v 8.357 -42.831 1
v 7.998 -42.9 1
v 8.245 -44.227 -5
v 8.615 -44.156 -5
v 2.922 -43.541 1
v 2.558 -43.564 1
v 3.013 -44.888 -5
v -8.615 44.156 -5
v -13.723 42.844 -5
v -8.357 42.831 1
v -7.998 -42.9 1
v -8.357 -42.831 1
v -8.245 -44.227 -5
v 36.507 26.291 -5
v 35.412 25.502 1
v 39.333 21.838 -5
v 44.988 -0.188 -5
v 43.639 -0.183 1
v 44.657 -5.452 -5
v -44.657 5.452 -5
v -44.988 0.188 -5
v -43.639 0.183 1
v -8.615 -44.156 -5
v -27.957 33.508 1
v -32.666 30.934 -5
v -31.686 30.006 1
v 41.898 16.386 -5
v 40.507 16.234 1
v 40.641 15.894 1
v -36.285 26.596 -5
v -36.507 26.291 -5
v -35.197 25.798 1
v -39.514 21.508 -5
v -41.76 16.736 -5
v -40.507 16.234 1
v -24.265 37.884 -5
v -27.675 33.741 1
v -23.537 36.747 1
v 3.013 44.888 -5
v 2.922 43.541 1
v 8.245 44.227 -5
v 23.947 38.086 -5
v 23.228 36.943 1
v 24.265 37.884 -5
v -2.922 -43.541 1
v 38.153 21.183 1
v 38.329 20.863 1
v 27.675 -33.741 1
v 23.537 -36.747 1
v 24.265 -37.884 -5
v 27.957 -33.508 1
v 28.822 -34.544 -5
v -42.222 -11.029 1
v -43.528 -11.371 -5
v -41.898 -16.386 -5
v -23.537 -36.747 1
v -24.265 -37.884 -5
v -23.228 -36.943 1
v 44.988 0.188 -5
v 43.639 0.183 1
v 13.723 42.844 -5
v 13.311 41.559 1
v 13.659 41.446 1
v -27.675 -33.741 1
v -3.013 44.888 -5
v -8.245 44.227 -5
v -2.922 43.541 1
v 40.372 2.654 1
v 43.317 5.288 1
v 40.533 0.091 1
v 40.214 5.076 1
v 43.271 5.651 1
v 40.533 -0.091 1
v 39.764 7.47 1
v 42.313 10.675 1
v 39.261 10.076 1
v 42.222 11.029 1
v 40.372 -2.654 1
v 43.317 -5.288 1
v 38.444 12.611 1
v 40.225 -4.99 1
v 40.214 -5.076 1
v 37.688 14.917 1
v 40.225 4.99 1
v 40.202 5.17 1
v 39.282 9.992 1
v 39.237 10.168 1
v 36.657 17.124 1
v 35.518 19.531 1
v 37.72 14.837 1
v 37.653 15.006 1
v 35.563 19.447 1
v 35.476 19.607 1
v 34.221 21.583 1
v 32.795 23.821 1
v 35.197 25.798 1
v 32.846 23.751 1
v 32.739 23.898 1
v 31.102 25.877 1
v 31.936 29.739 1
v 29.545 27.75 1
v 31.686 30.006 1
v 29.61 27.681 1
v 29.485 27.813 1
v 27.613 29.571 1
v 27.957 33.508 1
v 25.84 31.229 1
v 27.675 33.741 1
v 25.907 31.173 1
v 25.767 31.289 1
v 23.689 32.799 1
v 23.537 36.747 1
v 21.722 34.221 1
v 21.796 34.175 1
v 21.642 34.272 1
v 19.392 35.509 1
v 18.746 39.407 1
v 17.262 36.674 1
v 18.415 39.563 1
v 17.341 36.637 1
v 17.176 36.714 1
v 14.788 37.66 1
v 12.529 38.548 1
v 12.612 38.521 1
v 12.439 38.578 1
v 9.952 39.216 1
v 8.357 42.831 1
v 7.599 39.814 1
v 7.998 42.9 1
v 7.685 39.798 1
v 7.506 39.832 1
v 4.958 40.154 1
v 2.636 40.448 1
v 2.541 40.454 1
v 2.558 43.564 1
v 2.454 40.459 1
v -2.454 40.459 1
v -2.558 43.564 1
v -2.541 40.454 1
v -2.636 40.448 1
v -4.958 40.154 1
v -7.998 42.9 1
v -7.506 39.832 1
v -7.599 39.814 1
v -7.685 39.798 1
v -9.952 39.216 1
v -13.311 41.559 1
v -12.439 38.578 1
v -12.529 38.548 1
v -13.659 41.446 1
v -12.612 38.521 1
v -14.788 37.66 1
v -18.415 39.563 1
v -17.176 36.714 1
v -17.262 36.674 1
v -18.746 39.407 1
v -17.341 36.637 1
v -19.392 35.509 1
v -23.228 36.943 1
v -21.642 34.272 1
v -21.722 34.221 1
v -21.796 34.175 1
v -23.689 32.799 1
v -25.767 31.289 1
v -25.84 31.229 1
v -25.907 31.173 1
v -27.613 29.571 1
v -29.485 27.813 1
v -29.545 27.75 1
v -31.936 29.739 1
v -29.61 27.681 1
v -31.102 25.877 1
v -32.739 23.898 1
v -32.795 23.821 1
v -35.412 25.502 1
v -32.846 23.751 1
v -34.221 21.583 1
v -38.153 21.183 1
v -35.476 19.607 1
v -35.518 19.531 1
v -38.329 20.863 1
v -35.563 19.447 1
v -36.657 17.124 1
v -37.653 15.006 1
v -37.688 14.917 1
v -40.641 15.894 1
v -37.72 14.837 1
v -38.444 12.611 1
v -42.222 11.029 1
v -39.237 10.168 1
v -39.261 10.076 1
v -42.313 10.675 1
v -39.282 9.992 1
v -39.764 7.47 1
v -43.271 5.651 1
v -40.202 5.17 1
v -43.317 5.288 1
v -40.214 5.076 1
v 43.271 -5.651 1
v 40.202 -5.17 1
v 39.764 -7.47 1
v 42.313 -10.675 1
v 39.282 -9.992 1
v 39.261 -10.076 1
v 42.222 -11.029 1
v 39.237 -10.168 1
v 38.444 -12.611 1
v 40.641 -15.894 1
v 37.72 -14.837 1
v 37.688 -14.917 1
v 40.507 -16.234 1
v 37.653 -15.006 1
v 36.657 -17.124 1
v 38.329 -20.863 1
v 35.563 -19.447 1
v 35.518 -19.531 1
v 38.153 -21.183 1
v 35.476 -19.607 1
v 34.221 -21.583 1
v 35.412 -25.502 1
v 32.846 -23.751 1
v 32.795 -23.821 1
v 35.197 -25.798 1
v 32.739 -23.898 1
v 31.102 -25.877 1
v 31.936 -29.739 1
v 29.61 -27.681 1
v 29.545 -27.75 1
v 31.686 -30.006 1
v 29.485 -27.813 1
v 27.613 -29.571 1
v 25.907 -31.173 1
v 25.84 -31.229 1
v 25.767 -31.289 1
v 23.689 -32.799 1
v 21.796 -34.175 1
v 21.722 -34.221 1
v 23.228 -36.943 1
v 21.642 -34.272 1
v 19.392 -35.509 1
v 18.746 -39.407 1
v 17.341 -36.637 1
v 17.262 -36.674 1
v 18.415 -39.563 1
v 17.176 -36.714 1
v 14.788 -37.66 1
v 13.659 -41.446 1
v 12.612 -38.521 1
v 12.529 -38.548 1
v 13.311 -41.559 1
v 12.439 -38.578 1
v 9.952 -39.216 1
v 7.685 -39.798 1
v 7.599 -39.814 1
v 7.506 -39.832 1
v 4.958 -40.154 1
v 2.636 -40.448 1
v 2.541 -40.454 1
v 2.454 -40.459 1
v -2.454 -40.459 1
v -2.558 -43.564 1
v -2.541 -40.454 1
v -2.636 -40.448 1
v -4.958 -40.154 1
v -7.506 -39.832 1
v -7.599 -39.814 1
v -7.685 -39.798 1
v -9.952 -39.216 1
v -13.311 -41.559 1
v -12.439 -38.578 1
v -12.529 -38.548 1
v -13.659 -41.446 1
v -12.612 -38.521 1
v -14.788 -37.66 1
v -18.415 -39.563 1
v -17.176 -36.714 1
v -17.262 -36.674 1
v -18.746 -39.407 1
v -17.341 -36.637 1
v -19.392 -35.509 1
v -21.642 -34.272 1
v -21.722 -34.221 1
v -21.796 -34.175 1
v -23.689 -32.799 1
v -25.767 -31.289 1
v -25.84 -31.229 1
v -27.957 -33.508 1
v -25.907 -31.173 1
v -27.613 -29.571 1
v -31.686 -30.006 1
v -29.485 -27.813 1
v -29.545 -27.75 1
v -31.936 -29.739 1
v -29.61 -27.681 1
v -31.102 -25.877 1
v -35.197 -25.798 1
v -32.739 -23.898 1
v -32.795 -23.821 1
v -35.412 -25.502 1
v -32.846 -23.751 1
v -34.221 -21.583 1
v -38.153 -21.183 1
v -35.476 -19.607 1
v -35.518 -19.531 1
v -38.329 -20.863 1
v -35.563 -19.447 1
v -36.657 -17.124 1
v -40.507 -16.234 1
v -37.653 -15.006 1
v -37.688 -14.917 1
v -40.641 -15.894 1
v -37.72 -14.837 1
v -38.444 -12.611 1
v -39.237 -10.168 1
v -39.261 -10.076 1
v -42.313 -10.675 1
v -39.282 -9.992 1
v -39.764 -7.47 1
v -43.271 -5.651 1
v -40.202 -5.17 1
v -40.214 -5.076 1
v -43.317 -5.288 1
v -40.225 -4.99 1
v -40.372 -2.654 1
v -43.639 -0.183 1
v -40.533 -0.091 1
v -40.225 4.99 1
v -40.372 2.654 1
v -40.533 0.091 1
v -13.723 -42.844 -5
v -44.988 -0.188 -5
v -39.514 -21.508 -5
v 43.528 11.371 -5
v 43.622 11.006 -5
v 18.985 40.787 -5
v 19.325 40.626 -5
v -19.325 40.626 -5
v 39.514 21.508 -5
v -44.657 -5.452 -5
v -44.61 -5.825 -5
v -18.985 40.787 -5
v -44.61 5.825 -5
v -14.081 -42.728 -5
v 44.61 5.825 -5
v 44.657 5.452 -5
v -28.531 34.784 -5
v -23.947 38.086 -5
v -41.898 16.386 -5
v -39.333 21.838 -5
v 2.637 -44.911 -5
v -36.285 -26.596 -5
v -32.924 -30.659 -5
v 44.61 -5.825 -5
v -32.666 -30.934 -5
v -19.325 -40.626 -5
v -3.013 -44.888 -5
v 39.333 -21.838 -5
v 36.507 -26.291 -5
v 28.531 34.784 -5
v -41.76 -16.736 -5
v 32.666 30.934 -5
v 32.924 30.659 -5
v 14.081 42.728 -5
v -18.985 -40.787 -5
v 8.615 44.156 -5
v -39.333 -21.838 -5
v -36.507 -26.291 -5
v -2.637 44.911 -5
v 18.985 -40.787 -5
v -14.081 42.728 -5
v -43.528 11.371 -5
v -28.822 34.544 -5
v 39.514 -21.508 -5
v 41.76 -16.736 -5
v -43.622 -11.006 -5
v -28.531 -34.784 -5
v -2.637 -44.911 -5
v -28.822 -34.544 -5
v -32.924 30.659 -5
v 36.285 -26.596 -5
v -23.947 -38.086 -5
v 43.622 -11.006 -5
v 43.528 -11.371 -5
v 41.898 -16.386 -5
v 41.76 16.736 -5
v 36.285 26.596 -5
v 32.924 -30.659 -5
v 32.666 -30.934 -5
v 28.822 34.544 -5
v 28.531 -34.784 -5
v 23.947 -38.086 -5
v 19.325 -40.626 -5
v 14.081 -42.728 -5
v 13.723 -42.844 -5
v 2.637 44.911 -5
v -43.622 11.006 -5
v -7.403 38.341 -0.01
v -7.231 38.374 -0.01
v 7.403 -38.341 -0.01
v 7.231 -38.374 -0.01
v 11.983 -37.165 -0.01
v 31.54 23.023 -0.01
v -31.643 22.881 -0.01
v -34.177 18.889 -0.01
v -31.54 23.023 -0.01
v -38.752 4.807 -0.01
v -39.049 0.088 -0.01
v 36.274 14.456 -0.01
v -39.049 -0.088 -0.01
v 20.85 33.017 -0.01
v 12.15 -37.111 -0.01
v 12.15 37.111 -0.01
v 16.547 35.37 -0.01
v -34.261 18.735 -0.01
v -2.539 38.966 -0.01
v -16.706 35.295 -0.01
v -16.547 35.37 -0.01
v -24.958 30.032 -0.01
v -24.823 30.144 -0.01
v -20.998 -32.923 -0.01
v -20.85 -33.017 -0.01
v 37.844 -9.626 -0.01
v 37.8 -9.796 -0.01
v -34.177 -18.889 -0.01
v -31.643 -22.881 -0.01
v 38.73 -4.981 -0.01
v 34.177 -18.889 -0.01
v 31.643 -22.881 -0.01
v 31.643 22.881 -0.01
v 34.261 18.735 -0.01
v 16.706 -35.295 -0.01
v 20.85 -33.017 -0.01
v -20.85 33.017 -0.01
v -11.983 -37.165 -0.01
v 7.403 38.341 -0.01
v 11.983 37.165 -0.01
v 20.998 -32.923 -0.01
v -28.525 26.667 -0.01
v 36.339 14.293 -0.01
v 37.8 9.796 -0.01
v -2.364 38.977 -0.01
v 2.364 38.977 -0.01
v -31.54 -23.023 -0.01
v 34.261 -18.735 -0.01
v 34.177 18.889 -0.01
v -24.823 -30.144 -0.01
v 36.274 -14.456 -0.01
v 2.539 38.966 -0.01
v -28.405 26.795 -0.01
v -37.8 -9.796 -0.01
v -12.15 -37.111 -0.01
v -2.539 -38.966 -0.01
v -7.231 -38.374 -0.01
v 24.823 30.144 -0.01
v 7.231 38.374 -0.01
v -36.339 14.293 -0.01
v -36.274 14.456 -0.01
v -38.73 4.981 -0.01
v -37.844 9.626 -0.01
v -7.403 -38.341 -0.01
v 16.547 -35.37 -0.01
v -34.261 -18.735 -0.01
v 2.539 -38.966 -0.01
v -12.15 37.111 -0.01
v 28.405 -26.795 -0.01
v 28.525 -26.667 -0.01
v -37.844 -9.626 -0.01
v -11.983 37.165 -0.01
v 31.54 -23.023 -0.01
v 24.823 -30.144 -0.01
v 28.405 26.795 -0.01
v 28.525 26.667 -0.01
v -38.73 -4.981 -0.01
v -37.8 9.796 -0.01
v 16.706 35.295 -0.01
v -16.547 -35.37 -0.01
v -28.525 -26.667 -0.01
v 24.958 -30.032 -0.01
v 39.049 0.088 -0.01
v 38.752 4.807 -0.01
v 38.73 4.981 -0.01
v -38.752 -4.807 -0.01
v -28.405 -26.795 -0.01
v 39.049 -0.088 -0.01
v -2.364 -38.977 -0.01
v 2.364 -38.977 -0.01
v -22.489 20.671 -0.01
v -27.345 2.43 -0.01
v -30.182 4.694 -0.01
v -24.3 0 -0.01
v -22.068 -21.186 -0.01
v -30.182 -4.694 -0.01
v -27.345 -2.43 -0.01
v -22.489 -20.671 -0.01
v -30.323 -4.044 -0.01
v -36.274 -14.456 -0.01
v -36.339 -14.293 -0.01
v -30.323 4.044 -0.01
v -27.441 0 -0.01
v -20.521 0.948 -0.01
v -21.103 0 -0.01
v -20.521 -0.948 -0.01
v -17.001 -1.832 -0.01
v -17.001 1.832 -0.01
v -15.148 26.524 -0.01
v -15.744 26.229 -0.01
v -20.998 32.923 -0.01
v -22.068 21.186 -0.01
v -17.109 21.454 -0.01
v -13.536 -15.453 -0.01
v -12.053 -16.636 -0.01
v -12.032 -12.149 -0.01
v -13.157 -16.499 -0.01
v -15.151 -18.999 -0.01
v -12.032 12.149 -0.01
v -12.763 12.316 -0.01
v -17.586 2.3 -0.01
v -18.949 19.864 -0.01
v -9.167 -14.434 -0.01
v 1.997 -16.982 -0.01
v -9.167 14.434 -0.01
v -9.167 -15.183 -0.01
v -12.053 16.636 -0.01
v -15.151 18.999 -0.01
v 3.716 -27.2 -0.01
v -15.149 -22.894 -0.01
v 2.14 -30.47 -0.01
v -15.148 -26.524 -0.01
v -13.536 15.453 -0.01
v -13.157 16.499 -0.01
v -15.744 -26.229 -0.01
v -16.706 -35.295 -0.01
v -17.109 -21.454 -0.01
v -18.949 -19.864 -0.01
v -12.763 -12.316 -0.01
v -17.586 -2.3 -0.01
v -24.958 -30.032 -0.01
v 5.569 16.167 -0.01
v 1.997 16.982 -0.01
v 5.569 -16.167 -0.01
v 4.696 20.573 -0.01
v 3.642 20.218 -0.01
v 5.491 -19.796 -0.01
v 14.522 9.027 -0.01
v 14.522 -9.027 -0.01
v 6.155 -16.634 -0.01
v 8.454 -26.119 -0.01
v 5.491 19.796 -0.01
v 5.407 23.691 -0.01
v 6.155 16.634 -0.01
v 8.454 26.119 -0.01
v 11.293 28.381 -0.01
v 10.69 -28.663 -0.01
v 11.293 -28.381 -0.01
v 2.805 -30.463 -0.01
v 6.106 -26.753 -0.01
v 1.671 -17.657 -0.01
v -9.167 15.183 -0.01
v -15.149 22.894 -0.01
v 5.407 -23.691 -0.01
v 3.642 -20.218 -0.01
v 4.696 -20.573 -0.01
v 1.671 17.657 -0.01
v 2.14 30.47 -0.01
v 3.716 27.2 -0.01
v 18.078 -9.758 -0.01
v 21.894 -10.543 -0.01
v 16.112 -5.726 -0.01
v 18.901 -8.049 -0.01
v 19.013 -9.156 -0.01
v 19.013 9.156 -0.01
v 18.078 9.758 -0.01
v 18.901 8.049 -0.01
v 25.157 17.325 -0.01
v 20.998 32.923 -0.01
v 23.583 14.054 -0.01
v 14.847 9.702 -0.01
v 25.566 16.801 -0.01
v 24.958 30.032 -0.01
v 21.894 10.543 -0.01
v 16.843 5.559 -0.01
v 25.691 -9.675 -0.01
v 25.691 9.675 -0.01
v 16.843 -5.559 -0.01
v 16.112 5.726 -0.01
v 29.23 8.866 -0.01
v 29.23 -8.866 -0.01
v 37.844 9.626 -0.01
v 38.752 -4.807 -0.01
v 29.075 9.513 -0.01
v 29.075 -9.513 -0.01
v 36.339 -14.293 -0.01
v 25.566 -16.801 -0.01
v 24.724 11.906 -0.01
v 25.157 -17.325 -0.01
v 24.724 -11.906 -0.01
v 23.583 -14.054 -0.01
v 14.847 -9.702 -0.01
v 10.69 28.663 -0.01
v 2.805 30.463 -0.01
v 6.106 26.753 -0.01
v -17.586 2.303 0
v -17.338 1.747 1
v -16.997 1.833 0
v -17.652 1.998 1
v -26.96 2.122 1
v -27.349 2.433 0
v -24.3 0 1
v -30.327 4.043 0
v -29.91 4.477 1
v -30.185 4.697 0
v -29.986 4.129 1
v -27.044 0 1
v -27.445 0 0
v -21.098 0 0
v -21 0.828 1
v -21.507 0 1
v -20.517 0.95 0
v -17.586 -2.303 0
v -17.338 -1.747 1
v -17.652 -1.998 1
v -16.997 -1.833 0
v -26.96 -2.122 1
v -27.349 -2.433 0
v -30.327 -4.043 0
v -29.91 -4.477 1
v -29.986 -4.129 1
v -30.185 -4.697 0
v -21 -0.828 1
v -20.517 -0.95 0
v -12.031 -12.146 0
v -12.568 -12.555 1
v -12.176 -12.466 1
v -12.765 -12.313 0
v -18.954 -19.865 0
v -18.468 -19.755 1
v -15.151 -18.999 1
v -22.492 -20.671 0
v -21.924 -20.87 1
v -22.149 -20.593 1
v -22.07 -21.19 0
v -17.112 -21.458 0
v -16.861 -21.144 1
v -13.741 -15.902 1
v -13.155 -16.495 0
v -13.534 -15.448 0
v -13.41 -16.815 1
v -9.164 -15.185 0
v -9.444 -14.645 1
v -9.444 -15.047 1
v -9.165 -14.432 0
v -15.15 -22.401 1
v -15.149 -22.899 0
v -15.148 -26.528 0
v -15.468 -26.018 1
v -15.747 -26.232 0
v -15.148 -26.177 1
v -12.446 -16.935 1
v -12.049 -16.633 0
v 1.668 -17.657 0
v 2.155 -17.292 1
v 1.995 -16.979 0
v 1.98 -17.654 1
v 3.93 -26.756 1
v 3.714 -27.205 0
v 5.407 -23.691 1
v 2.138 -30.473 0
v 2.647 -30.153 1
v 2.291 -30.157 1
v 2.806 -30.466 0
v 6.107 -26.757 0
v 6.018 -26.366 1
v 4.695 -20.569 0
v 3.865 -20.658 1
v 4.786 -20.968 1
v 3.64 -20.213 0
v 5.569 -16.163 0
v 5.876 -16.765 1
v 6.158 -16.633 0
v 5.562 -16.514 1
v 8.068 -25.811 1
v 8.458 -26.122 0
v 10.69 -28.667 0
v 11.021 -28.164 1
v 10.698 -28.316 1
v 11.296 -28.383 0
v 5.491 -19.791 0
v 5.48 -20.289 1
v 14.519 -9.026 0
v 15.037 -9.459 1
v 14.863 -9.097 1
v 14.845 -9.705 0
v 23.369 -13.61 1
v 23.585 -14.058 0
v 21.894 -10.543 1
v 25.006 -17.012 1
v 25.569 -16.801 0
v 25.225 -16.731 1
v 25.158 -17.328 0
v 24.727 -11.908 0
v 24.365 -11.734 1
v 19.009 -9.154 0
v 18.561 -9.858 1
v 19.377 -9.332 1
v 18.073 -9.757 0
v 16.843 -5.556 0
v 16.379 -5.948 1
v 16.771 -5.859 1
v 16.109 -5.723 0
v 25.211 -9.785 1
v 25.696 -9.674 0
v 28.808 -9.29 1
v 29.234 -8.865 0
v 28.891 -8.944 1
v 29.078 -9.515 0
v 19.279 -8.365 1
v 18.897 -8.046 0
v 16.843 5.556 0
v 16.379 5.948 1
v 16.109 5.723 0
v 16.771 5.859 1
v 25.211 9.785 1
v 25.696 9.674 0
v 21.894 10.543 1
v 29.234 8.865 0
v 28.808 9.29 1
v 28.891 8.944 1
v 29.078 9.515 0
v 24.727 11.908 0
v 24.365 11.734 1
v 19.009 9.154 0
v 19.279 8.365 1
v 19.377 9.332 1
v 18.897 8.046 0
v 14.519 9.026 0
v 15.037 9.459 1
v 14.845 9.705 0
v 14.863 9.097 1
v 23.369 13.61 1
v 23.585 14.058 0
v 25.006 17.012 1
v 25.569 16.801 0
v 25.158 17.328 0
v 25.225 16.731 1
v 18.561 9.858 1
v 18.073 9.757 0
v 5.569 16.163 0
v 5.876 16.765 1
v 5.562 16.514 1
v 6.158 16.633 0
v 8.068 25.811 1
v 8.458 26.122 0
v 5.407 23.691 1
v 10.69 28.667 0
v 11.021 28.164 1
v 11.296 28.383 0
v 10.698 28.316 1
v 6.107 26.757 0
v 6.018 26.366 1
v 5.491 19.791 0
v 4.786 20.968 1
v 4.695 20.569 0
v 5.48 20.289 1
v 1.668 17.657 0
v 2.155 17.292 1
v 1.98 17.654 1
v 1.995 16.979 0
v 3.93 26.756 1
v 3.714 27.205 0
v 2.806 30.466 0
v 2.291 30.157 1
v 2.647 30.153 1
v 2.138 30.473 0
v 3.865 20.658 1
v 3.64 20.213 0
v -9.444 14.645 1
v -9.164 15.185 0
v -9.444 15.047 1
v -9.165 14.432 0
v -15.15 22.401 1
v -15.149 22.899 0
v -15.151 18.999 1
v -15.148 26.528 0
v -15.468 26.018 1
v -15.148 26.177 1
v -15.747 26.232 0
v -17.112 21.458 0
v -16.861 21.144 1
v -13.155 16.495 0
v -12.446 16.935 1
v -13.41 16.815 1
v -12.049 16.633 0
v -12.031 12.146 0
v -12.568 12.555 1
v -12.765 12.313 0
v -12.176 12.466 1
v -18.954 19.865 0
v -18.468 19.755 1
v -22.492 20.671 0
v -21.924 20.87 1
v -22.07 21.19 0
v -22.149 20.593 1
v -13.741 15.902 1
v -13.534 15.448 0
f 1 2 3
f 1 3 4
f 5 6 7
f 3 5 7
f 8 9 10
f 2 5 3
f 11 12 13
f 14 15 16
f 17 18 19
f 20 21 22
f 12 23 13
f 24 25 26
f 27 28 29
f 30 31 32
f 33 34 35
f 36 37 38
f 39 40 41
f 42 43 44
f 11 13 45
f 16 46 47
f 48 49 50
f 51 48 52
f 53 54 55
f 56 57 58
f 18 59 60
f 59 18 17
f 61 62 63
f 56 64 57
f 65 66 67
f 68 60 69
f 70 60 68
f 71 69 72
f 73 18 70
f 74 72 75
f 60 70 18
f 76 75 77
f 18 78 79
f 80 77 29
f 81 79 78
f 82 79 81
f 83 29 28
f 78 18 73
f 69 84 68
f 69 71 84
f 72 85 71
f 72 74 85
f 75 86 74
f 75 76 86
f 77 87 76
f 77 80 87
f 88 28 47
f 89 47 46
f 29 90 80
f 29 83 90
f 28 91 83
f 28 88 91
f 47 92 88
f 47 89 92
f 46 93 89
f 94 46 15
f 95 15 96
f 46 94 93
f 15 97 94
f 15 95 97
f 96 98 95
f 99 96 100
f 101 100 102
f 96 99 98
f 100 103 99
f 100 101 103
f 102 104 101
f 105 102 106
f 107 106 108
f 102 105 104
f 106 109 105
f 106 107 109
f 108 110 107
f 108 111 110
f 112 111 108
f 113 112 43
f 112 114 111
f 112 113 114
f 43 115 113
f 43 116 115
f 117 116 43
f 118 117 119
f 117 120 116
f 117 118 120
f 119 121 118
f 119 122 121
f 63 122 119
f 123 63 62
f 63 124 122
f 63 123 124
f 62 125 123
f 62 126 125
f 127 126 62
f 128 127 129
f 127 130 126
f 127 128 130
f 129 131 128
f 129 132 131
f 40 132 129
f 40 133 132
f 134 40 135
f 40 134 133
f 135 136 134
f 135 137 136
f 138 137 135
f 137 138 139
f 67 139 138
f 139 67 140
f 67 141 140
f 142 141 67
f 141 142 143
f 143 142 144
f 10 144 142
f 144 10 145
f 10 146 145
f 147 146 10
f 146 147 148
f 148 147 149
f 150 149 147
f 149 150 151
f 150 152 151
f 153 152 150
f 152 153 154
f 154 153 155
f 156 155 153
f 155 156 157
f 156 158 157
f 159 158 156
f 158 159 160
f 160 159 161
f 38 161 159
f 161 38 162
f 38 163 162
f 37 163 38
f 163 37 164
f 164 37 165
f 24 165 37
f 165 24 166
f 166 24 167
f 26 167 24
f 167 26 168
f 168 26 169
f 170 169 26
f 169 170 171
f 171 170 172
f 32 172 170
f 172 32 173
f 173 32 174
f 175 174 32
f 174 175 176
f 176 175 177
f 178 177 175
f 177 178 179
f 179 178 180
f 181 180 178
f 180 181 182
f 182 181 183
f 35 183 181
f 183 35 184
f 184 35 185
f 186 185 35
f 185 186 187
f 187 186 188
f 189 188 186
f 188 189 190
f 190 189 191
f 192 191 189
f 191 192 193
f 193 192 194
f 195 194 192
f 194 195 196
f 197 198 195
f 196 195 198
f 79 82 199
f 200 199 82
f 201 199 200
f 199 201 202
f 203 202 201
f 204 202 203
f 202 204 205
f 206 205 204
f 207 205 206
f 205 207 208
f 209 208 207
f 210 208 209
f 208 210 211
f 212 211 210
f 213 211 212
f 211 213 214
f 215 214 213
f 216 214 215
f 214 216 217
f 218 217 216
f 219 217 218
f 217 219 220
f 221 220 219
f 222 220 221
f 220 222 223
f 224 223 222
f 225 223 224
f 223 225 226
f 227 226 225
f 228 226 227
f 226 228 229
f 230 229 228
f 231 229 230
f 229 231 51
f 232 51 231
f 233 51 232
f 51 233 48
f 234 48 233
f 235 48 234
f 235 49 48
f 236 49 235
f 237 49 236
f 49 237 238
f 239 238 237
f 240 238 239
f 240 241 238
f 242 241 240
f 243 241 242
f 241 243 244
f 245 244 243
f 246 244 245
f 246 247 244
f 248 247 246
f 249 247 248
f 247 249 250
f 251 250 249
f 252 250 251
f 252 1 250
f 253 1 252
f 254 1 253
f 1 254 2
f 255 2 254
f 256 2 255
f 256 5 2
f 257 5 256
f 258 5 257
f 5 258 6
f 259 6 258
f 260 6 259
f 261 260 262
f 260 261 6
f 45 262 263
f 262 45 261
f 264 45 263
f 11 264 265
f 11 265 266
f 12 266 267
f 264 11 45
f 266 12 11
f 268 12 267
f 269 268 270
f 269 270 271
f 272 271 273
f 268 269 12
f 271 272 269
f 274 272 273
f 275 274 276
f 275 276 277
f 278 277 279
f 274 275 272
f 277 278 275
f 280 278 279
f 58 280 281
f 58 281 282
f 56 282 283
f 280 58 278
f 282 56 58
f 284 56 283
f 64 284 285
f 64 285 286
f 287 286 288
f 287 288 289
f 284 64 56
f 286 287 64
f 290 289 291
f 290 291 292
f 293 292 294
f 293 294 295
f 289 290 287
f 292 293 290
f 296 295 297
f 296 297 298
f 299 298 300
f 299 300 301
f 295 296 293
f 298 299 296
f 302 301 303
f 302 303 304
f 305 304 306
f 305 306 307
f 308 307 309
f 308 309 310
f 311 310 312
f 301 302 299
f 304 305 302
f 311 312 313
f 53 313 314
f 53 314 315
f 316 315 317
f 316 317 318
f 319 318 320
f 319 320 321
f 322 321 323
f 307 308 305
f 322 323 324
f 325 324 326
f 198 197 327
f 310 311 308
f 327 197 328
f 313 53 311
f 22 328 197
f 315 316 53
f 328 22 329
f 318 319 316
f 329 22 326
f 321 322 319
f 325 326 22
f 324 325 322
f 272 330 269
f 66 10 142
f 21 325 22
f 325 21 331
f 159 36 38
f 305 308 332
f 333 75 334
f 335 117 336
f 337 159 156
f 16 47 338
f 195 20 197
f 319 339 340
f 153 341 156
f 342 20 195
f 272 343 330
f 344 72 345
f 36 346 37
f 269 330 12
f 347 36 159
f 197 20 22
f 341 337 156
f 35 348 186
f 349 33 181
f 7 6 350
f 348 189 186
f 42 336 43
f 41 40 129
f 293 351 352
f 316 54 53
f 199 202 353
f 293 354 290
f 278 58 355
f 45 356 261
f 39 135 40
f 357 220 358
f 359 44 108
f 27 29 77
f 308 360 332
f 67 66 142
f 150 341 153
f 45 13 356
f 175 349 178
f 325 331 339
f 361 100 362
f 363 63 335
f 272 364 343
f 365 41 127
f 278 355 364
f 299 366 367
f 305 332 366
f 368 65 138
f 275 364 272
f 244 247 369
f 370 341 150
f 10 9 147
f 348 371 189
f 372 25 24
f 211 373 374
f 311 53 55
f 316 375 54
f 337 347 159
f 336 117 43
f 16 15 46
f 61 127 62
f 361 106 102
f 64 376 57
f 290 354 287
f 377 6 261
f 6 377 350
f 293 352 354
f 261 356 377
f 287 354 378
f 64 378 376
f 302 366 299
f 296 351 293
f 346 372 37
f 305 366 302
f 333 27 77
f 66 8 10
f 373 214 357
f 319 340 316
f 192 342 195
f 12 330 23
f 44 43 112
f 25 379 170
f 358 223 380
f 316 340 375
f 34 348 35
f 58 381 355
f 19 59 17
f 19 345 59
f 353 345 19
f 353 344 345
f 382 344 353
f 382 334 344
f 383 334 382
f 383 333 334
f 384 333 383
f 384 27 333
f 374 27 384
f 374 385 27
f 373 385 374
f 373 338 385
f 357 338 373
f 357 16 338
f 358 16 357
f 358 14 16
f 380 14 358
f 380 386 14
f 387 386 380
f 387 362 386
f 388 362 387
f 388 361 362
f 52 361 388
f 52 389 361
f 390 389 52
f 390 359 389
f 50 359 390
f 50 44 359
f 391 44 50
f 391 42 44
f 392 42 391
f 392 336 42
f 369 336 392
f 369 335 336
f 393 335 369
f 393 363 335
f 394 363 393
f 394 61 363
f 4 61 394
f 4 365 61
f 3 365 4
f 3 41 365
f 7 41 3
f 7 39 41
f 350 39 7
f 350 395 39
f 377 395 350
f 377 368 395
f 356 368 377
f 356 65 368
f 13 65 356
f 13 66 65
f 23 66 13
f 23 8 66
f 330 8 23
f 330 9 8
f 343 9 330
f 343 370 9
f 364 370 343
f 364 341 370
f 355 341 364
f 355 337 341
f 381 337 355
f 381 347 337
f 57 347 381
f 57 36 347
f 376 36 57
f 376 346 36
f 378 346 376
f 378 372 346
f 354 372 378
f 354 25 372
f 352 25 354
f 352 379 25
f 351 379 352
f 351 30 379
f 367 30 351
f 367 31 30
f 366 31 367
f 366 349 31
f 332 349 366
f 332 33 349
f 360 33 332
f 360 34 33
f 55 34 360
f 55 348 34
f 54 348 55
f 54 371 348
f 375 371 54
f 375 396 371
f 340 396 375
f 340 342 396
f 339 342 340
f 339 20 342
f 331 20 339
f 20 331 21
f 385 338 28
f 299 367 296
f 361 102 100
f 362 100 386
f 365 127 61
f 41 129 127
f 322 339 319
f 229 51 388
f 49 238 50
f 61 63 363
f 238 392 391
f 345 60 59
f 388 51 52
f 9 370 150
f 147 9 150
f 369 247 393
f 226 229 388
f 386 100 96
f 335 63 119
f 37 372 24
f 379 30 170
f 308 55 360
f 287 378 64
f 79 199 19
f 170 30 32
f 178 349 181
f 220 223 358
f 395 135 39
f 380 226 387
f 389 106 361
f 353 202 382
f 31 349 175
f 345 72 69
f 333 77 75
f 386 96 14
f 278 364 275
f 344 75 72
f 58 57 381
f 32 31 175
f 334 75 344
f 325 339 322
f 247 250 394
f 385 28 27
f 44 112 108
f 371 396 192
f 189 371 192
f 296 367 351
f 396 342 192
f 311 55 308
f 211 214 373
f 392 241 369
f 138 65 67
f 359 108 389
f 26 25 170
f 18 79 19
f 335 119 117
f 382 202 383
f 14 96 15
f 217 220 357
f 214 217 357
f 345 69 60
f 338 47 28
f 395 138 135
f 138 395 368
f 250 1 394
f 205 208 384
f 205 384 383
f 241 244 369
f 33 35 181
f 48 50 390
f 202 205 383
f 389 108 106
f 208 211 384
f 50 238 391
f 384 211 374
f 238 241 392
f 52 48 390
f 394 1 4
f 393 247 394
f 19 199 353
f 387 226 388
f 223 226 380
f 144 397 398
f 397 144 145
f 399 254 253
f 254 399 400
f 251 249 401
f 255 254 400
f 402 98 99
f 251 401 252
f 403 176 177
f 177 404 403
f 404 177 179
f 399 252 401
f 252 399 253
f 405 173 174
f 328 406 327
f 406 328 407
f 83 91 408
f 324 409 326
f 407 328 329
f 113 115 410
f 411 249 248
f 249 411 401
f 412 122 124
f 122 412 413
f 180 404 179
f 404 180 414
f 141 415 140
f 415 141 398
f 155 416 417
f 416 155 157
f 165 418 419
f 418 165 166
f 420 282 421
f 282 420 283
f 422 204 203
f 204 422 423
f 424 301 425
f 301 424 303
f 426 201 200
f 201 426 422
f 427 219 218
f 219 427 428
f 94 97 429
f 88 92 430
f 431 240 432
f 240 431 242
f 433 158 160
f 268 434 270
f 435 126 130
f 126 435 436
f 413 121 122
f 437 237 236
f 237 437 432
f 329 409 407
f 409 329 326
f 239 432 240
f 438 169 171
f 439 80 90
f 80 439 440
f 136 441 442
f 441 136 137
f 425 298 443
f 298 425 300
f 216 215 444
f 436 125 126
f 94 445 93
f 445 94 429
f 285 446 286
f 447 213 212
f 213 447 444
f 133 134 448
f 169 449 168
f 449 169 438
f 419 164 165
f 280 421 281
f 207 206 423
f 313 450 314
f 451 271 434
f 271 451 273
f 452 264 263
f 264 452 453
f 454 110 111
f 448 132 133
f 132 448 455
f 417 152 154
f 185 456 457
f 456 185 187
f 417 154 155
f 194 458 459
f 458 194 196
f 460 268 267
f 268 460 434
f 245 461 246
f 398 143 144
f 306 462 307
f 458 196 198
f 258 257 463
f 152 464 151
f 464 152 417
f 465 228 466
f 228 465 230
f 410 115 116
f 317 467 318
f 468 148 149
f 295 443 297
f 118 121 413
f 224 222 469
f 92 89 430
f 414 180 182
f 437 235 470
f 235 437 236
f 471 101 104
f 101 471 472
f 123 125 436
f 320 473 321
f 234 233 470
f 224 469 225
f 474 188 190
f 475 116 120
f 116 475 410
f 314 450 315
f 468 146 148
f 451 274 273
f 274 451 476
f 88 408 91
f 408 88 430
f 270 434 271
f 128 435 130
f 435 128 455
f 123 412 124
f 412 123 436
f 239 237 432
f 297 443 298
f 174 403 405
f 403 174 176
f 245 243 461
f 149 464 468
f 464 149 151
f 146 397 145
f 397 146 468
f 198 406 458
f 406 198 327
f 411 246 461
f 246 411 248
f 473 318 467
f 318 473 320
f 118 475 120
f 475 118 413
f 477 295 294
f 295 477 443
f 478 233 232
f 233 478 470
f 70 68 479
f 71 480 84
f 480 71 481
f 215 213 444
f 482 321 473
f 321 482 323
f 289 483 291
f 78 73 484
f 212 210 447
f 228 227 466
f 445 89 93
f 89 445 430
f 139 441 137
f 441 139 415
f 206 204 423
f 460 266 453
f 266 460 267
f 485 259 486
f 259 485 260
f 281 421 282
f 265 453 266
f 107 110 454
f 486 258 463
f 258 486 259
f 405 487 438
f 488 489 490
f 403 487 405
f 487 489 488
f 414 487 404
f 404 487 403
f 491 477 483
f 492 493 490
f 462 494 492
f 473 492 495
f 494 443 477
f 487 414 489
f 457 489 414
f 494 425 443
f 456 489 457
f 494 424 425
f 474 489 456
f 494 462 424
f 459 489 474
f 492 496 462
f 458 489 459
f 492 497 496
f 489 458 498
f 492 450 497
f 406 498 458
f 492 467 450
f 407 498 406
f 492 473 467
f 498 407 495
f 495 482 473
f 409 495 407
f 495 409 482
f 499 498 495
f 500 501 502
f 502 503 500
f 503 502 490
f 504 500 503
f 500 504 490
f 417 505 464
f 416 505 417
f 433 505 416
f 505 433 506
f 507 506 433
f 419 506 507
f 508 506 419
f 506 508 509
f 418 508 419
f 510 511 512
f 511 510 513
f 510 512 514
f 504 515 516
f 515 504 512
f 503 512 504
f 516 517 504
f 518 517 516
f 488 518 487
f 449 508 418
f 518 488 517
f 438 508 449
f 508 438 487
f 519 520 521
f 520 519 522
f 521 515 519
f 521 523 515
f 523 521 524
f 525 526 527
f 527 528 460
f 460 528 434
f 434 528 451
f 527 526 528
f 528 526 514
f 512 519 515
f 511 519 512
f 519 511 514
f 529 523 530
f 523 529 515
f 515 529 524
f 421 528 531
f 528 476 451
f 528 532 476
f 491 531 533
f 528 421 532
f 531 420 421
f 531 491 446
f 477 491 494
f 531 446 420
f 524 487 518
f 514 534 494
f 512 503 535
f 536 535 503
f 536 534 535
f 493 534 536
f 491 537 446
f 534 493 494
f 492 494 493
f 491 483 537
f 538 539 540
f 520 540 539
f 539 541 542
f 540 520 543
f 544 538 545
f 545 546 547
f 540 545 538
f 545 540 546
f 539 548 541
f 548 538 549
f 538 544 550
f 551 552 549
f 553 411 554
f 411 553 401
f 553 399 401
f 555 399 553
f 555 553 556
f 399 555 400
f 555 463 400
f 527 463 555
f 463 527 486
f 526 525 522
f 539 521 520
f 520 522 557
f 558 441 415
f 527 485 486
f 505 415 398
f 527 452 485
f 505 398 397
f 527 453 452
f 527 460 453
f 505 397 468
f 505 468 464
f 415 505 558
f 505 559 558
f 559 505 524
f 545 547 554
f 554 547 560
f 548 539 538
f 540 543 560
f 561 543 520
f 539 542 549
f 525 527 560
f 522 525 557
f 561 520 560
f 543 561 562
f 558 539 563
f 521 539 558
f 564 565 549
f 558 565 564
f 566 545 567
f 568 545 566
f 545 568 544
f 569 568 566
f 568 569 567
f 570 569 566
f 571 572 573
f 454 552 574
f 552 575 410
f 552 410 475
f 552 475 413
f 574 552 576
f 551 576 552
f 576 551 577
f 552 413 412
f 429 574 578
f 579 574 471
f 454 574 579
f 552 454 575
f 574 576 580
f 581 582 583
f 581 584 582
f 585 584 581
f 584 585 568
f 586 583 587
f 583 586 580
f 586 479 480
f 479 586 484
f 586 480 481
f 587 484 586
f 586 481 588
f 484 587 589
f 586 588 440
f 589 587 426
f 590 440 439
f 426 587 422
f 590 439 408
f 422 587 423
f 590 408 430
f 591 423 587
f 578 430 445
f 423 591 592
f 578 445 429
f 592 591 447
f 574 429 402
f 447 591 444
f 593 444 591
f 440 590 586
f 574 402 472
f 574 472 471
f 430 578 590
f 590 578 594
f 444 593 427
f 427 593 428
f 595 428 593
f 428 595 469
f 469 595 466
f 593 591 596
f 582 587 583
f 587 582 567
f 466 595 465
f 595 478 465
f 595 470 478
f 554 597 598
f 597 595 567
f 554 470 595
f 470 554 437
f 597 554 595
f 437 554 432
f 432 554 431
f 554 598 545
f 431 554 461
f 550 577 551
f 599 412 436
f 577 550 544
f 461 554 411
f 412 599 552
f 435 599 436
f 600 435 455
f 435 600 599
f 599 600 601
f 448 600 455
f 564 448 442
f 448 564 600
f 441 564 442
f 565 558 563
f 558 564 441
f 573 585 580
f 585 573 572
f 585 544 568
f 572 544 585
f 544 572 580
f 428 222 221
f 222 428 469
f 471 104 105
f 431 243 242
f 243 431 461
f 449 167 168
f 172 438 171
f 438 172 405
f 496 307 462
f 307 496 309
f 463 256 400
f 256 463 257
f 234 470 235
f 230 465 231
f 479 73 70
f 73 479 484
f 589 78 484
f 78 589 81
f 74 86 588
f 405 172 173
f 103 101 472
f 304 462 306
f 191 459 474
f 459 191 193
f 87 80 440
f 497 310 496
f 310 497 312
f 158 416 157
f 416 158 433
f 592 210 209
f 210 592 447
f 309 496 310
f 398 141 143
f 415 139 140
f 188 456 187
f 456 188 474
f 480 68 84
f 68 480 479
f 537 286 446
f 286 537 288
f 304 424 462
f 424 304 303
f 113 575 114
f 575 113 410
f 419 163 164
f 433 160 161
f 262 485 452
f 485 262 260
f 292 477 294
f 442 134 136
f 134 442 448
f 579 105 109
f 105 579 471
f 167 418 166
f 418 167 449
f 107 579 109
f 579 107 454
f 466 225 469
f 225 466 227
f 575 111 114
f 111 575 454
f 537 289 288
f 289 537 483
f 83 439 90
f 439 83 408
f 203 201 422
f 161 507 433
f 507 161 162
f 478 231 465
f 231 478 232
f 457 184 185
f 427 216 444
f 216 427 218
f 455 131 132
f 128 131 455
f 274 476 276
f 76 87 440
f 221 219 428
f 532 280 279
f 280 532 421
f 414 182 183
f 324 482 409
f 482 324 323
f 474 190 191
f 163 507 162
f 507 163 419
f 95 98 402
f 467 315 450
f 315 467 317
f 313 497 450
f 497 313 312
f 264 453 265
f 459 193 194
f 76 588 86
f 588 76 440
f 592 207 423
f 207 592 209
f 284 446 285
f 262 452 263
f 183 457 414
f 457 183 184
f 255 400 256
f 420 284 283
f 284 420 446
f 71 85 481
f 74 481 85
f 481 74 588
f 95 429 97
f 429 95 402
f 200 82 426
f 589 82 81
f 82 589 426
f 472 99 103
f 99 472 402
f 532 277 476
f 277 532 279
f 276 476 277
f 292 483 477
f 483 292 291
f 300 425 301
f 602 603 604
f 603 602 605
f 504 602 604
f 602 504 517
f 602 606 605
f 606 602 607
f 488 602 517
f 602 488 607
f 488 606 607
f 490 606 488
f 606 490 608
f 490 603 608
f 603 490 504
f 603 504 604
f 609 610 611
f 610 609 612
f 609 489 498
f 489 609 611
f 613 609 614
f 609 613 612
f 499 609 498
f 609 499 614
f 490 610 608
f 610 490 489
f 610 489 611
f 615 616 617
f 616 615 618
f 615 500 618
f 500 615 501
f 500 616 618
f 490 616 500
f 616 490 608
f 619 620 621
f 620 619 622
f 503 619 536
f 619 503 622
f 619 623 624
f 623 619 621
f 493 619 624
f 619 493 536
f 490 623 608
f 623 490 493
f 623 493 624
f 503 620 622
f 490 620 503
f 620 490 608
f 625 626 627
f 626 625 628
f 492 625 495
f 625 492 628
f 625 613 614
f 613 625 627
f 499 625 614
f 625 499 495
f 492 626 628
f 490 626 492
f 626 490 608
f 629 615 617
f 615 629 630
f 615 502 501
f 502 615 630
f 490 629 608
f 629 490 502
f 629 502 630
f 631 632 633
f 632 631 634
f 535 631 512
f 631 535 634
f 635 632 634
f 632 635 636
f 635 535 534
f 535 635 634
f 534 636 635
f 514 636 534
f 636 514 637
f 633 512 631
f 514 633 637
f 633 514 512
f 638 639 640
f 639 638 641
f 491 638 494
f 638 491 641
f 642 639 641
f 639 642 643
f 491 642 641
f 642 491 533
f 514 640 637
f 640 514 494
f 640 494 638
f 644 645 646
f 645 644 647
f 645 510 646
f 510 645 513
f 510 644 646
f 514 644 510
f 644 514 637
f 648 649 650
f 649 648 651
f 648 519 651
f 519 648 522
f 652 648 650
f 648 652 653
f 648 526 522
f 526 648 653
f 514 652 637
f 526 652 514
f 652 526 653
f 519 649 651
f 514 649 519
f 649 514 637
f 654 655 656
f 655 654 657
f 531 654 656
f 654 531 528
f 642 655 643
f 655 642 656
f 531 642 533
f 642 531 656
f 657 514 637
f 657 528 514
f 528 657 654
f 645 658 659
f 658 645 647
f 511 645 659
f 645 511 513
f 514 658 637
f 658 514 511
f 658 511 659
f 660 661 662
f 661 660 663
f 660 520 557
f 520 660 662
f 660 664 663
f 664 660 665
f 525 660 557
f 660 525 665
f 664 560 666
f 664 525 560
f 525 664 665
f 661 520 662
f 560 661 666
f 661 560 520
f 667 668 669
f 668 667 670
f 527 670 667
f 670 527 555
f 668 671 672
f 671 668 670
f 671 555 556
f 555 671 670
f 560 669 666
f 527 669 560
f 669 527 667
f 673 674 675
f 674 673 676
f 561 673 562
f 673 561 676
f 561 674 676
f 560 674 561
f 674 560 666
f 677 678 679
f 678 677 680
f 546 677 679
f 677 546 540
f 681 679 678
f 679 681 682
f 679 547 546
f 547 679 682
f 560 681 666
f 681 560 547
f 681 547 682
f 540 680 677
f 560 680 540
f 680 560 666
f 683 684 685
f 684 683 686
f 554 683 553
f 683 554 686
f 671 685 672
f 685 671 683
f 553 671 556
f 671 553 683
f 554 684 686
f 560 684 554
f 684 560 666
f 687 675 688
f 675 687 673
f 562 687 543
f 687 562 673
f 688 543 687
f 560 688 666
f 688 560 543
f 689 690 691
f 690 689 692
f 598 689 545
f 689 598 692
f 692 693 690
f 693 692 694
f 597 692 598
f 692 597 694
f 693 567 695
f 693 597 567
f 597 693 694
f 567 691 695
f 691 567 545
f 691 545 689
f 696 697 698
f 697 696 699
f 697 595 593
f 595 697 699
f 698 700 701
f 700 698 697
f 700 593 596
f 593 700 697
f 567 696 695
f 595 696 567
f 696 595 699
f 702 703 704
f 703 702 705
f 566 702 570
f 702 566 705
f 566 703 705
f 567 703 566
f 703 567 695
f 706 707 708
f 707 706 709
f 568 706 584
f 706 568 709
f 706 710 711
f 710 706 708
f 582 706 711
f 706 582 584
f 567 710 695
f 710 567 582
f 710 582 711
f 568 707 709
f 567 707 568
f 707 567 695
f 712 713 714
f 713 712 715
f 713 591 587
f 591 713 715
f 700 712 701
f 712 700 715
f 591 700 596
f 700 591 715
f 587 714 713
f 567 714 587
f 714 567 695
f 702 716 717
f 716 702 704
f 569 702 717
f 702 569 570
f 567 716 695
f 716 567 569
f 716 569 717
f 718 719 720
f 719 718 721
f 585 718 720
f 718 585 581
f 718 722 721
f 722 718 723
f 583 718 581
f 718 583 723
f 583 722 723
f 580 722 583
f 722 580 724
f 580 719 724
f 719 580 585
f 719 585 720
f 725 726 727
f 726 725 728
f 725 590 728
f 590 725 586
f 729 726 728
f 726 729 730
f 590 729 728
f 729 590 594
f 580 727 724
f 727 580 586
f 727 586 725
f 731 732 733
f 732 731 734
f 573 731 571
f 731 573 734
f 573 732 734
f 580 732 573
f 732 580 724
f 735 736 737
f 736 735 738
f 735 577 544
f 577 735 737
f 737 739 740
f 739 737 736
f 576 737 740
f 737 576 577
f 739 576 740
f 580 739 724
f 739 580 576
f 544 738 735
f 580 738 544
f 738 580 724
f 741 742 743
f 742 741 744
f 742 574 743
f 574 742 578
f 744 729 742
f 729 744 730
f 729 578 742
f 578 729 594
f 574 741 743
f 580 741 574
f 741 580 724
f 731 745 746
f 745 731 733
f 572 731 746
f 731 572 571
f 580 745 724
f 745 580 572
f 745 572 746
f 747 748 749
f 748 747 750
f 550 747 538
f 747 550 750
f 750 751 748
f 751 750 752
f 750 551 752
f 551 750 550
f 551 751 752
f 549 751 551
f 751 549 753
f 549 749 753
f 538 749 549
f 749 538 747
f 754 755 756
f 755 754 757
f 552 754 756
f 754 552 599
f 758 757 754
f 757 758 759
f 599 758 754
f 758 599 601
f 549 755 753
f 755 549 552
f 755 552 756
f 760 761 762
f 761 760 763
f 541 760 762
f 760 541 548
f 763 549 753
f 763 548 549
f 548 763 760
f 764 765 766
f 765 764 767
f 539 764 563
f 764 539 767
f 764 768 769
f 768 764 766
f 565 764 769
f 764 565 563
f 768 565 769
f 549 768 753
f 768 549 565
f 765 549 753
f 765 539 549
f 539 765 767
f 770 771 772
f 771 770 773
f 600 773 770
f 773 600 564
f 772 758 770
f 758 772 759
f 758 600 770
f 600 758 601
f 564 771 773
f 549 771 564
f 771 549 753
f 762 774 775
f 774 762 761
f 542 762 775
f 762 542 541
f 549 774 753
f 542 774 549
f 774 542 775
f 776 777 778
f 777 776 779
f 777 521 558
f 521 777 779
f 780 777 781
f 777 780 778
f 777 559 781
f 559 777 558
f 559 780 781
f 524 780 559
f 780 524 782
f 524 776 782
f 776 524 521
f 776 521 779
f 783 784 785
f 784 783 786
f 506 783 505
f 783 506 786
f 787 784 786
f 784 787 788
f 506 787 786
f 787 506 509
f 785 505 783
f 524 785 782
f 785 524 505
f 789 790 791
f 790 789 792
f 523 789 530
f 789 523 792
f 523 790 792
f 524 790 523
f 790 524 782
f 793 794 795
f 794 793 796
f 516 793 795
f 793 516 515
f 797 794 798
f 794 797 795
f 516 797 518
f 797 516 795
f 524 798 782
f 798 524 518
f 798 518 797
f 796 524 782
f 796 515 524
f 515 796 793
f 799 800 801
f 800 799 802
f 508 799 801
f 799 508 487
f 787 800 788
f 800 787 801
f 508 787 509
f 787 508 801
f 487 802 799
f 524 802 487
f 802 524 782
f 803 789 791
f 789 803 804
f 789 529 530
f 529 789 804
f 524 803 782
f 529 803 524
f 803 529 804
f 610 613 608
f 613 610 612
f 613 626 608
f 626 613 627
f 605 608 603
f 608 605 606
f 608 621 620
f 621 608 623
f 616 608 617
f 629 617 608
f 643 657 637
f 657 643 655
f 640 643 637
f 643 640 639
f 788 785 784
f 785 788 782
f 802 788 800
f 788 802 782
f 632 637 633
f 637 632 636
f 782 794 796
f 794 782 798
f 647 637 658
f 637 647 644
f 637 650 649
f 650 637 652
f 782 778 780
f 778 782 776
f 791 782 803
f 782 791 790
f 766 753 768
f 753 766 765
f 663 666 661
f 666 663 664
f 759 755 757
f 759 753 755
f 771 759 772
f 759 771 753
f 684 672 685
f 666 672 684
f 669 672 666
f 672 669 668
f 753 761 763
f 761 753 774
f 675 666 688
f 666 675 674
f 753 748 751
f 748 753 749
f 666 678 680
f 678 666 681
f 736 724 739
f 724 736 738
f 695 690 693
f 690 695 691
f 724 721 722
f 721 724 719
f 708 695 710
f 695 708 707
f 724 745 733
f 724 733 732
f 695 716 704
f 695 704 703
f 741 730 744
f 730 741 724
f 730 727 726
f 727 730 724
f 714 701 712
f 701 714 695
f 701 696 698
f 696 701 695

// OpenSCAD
Seed=6547648057;//
Seeded=0;//[1,0]

Oscale=[0.9,0.9];//
plate=45;//
thickness=5;
/*[Hidden]*/
baser=rnd(Seed+1,1.4,2);
phase=rnd(Seed+2,360);

mag1=rnd(Seed+3,6)*baser;
rep1=round(rnd(Seed+4,0,8));
ophase1=rnd(Seed+5,360);

mag2=rnd(Seed+6,6)*baser;
rep2=round(rnd(Seed+7,3,10));
ophase2=rnd(Seed+8,360);

phase0=rnd(Seed+9,360);
r0=rnd(Seed+10,0,1);
phase1=rnd(Seed+1,360);
r1=rnd(Seed+11,0,1)/2;
phase2=rnd(Seed+1,360);
r2=rnd(Seed+12,0,1)/3;
phase3=rnd(Seed+1,360);
r3=rnd(Seed+13,0,1)/4;
phase8=rnd(Seed+1,360);
r8=rnd(Seed+14,0,1)/8;
rsym1=round(rnd(Seed+15,1,8));
rsym2=round(rnd(Seed+16,0,rnd(Seed+16,16)));
msym1=round(rnd(Seed+17,0,rsym1));
msym2=round(rnd(Seed+18,0,rsym2));
rsum=baser+r0+r1+r2+r3+r8;
step=24*rsym1;
d=rnd(Seed+19,360);
e=rnd(Seed+20,-0.1,0.1);

dir=[rnd(Seed+21,-0,-0.5,Seed-23),0.5,0]*10;
golds=["DarkGoldenrod","Goldenrod"];
difference(){
color("DarkGoldenrod")translate([0,0,-thickness]) linear_extrude(height = thickness +1,  convexity = 10, scale=0.97,$fn=50)offset(r=3, chamfer=true)offset(r=-3, chamfer=false) circle(plate,center=true);
color("Goldenrod")mirror([0,0,1])translate([0,0,-1.99]) linear_extrude(height = 2,  convexity = 10, scale=0.93,$fn=50)offset(delta=3, chamfer=true)offset(r=-6, chamfer=false) circle(plate,center=true);
}

up=[0,0,-2];
intersection(){
color("DarkGoldenrod")translate([0,0,-thickness]) linear_extrude(height = thickness +1,  convexity = 10, scale=0.97,$fn=50)offset(r=3, chamfer=true)offset(r=-3, chamfer=false) circle(plate,center=true);

color("DarkGoldenrod")translate([0,0,0]) scale([Oscale[0]*plate,Oscale[1]*plate,30]) symmetries(rsym1,msym1){translate([-0.7+0.7/rsym1,0,0])rotate([0,0,d])scale([0.3+0.7/rsym1,e+0.3+0.7/rsym1,1])symmetries(rsym2,msym2){it ();};
}
}
//symmetries(rsym2,msym2){it ();}
module symmetries(rsym,msym){
for(j=[0:360/rsym:360])rotate([0,0,j]){
intersection(){
if(msym==0) children ();else union(){
    intersection(){
    children ();
    translate([-1,0,-0.05])scale([2,1,0.2])cube(1);
    }
    mirror([0,1,0]) intersection(){
    children ();
    translate([-1,0,-0.05])scale([2,1,0.2])cube(1);
    }}

if(rsym>1){intersection(){
rotate ([0,0,(360/rsym)*0.5])translate([-1,0,-0.05])scale([2,1,0.2])cube(1);
mirror([0,1,0])rotate ([0,0,(360/rsym)*0.5])translate([-1,0,-0.05])scale([2,1,0.2])cube(1);
}}else {scale([1,1,0.2])cube(2,center=true);
}
}}}

module it(){
cube(0.03,$fn=10);
for(i=[0:step:360]){hull(){
theta = i+ sin((i+ophase1)*rep1)*mag1+ sin((i+ophase2)*rep2)*mag2;
translate([
sin(theta+phase)*(baser+sin((i+phase0))*r0 +sin((i+phase1)*2)*r1+sin((i+phase2)*3)*r2+sin((i+phase3)*4)*r3+sin((i+phase8)*8)*r8)/rsum
,
cos(theta+phase)*(baser+sin((i+phase0))*r0+sin((i+phase1)*2)*r1+sin((i+phase2)*3)*r2+sin((i+phase3)*4)*r3+sin((i+phase8)*8)*r8)/rsum
,0

])sphere(0.09,$fn=6 );
ii=(i+step)%360;
theta2 = ii+ sin((ii+ophase1)*rep1)*mag1+ sin((ii+ophase2)*rep2)*mag2;
translate([
sin(theta2+phase)*(baser+sin((ii+phase0))*r0 +sin((ii+phase1)*2)*r1+sin((ii+phase2)*3)*r2+sin((ii+phase3)*4)*r3+sin((ii+phase8)*8)*r8)/rsum
,
cos(theta2+phase)*(baser+sin((ii+phase0))*r0+sin((ii+phase1)*2)*r1+sin((ii+phase2)*3)*r2+sin((ii+phase3)*4)*r3+sin((ii+phase8)*8)*r8)/rsum
,0

])sphere(0.09,$fn=6 );
}}}

 
function rndR()=[rands(0,360,1)[0],rands(0,360,1)[1],rands(0,360,1)[0]];

function un(v)=v/max(len3(v),0.000001)*1;
function p2n(pa,pb,pc)=
let(u=pa-pb,v=pa-pc)un([u[1]*v[2]-u[2]*v[1],u[2]*v[0]-u[0]*v[2],u[0]*v[1]-u[1]*v[0]]);
function avrg(v)=sumv(v,max(0,len(v)-1))/len(v);
function lerp(start,end,bias)=(end*bias+start*(1-bias));
function len3(v)=len(v)==2?sqrt(pow(v[0],2)+pow(v[1],2)):sqrt(pow(v[0],2)+pow(v[1],2)+pow(v[2],2));
function sumv(v,i,s=0)=(i==s?v[i]:v[i]+sumv(v,i-1,s));
function rnd(S,a=0,b=1)=Seeded==1?(rands(min(a,b),max(a,b),1,S)[0]):(rands(min(a,b),max(a,b),1)[0]);
function rndc()=[rands(0,1,1)[0],rands(0,1,1)[0],rands(0,1,1)[0]];
